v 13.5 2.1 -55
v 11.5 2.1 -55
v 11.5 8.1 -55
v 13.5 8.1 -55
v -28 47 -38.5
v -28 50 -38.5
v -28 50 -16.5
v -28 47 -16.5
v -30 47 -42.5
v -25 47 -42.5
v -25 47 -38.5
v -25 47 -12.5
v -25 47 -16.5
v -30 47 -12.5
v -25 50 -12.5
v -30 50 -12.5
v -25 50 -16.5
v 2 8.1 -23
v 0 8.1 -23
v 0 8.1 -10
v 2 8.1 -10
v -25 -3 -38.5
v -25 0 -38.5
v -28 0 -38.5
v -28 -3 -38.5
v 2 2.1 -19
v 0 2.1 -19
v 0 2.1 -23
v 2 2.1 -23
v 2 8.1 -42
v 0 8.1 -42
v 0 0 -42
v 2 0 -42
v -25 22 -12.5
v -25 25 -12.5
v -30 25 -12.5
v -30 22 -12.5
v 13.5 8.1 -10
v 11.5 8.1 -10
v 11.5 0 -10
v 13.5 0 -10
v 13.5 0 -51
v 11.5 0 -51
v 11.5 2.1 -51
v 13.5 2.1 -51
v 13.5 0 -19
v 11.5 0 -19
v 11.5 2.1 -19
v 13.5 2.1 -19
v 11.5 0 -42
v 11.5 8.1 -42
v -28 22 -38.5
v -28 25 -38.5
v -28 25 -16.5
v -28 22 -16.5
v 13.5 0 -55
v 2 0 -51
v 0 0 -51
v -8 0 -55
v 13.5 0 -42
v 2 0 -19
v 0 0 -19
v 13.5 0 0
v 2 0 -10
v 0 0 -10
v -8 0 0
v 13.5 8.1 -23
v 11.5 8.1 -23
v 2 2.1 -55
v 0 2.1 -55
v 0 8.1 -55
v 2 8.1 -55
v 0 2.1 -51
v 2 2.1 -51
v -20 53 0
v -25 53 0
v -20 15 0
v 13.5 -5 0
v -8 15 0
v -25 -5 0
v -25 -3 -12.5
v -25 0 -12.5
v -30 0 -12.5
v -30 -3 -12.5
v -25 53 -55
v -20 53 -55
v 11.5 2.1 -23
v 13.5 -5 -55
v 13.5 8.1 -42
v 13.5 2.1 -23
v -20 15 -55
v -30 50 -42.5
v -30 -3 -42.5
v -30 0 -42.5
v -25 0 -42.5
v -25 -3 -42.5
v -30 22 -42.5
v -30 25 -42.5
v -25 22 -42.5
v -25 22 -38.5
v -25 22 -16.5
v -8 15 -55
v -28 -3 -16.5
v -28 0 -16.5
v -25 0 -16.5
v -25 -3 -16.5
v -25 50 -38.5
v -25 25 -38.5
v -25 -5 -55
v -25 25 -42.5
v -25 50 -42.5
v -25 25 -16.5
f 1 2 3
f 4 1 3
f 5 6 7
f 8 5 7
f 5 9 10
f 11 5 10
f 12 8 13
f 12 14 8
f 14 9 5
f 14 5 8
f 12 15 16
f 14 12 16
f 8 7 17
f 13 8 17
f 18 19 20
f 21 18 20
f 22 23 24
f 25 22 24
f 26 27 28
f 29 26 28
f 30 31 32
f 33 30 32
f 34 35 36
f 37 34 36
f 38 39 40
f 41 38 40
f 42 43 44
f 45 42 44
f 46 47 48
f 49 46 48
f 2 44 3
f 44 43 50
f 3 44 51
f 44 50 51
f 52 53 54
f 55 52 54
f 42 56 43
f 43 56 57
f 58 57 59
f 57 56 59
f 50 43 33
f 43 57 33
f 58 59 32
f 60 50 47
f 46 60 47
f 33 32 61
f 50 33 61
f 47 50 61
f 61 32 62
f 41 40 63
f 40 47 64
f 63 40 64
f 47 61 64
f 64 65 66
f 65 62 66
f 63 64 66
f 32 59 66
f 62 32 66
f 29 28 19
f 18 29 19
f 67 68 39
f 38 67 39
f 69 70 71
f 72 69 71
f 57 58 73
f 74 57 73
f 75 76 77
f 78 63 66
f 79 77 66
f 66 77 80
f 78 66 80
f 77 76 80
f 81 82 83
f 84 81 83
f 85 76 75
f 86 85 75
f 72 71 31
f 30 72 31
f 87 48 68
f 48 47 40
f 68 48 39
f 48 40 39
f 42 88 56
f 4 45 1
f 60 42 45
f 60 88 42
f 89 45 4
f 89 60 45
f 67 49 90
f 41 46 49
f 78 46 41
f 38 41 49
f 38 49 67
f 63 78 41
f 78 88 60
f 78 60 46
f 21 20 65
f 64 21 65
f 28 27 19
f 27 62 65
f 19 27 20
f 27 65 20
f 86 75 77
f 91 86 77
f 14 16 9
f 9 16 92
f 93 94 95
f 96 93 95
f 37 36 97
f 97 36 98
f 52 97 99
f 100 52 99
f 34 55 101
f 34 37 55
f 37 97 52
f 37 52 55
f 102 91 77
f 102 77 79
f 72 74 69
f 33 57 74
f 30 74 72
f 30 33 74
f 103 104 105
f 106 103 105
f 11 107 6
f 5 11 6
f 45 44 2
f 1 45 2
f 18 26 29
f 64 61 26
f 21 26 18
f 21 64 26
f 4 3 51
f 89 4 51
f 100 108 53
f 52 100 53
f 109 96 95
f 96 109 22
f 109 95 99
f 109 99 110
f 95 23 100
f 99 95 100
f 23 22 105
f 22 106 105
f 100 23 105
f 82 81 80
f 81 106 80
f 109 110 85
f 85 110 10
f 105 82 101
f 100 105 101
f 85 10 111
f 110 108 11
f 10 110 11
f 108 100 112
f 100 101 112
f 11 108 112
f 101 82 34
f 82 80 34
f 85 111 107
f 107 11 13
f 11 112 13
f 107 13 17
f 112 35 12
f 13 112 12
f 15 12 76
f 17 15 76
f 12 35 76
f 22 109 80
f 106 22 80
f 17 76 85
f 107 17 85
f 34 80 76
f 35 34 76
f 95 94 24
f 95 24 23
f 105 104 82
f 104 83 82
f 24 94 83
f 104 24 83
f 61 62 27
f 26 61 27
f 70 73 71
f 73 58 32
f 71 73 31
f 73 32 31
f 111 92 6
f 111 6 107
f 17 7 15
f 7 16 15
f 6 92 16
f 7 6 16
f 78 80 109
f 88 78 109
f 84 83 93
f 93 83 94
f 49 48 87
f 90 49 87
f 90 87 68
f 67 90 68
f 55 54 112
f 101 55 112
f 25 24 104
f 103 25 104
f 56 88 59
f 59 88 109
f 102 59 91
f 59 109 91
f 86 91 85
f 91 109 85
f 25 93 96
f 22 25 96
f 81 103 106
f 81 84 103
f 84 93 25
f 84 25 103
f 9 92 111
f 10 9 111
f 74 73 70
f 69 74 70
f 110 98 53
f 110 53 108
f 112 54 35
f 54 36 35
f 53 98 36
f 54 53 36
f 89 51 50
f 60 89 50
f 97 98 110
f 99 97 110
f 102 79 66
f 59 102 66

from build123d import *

# Parameters (mm, degrees)
PAD_DEPTH              = 55
PAD003_DEPTH           = 2
SKETCH005_W            = 5
SKETCH005_H            = 55
PAD004_DEPTH           = 9.5
LINEARPATTERN_COUNT    = 2
LINEARPATTERN_PITCH    = 11.5
PAD005_DEPTH           = 3
LINEARPATTERN001_COUNT = 3
LINEARPATTERN001_PITCH = 25


with BuildPart() as part:
    # Sketch004 → Pad (new body)
    with BuildSketch(Plane.XY):
        Polygon((0, -5), (-25, -5), (-25, 53), (-20, 53), (-20, 15), (-8, 15), (-8, 0), (0, 0), align=None)
    extrude(amount=-PAD_DEPTH)

    # Sketch (on Face8 of Pad) → Pad003 (join)
    with BuildSketch(Plane.YZ):
        Polygon((-5, -55), (0, -55), (0, -51), (2.1, -51), (2.1, -55), (8.1, -55), (8.1, -42), (0, -42), (0, -19), (2.1, -19), (2.1, -23), (8.1, -23), (8.1, -10), (0, -10), (0, 0), (-5, 0), align=None)
    pad003 = extrude(amount=PAD003_DEPTH)

    # Sketch005 (on Face8 of Pad003) → Pad004 (join)
    with BuildSketch(Plane.YZ.offset(2)):
        with Locations((-2.5, -27.5)):
            Rectangle(SKETCH005_W, SKETCH005_H)
    extrude(amount=PAD004_DEPTH)

    # LinearPattern: Pad003 ×2
    with Locations(*[(i * LINEARPATTERN_PITCH, 0, 0) for i in range(1, LINEARPATTERN_COUNT)]):
        add(pad003)

    # Sketch006 (on DatumPlane) → Pad005 (join)
    with BuildSketch(Plane.XZ):
        Polygon((-25, -12.5), (-30, -12.5), (-30, -42.5), (-25, -42.5), (-25, -38.5), (-28, -38.5), (-28, -16.5), (-25, -16.5), align=None)
    pad005 = extrude(amount=PAD005_DEPTH)

    # LinearPattern001: Pad005 ×3
    with Locations(*[(0, i * LINEARPATTERN001_PITCH, 0) for i in range(1, LINEARPATTERN001_COUNT)]):
        add(pad005)


solid = part.part
